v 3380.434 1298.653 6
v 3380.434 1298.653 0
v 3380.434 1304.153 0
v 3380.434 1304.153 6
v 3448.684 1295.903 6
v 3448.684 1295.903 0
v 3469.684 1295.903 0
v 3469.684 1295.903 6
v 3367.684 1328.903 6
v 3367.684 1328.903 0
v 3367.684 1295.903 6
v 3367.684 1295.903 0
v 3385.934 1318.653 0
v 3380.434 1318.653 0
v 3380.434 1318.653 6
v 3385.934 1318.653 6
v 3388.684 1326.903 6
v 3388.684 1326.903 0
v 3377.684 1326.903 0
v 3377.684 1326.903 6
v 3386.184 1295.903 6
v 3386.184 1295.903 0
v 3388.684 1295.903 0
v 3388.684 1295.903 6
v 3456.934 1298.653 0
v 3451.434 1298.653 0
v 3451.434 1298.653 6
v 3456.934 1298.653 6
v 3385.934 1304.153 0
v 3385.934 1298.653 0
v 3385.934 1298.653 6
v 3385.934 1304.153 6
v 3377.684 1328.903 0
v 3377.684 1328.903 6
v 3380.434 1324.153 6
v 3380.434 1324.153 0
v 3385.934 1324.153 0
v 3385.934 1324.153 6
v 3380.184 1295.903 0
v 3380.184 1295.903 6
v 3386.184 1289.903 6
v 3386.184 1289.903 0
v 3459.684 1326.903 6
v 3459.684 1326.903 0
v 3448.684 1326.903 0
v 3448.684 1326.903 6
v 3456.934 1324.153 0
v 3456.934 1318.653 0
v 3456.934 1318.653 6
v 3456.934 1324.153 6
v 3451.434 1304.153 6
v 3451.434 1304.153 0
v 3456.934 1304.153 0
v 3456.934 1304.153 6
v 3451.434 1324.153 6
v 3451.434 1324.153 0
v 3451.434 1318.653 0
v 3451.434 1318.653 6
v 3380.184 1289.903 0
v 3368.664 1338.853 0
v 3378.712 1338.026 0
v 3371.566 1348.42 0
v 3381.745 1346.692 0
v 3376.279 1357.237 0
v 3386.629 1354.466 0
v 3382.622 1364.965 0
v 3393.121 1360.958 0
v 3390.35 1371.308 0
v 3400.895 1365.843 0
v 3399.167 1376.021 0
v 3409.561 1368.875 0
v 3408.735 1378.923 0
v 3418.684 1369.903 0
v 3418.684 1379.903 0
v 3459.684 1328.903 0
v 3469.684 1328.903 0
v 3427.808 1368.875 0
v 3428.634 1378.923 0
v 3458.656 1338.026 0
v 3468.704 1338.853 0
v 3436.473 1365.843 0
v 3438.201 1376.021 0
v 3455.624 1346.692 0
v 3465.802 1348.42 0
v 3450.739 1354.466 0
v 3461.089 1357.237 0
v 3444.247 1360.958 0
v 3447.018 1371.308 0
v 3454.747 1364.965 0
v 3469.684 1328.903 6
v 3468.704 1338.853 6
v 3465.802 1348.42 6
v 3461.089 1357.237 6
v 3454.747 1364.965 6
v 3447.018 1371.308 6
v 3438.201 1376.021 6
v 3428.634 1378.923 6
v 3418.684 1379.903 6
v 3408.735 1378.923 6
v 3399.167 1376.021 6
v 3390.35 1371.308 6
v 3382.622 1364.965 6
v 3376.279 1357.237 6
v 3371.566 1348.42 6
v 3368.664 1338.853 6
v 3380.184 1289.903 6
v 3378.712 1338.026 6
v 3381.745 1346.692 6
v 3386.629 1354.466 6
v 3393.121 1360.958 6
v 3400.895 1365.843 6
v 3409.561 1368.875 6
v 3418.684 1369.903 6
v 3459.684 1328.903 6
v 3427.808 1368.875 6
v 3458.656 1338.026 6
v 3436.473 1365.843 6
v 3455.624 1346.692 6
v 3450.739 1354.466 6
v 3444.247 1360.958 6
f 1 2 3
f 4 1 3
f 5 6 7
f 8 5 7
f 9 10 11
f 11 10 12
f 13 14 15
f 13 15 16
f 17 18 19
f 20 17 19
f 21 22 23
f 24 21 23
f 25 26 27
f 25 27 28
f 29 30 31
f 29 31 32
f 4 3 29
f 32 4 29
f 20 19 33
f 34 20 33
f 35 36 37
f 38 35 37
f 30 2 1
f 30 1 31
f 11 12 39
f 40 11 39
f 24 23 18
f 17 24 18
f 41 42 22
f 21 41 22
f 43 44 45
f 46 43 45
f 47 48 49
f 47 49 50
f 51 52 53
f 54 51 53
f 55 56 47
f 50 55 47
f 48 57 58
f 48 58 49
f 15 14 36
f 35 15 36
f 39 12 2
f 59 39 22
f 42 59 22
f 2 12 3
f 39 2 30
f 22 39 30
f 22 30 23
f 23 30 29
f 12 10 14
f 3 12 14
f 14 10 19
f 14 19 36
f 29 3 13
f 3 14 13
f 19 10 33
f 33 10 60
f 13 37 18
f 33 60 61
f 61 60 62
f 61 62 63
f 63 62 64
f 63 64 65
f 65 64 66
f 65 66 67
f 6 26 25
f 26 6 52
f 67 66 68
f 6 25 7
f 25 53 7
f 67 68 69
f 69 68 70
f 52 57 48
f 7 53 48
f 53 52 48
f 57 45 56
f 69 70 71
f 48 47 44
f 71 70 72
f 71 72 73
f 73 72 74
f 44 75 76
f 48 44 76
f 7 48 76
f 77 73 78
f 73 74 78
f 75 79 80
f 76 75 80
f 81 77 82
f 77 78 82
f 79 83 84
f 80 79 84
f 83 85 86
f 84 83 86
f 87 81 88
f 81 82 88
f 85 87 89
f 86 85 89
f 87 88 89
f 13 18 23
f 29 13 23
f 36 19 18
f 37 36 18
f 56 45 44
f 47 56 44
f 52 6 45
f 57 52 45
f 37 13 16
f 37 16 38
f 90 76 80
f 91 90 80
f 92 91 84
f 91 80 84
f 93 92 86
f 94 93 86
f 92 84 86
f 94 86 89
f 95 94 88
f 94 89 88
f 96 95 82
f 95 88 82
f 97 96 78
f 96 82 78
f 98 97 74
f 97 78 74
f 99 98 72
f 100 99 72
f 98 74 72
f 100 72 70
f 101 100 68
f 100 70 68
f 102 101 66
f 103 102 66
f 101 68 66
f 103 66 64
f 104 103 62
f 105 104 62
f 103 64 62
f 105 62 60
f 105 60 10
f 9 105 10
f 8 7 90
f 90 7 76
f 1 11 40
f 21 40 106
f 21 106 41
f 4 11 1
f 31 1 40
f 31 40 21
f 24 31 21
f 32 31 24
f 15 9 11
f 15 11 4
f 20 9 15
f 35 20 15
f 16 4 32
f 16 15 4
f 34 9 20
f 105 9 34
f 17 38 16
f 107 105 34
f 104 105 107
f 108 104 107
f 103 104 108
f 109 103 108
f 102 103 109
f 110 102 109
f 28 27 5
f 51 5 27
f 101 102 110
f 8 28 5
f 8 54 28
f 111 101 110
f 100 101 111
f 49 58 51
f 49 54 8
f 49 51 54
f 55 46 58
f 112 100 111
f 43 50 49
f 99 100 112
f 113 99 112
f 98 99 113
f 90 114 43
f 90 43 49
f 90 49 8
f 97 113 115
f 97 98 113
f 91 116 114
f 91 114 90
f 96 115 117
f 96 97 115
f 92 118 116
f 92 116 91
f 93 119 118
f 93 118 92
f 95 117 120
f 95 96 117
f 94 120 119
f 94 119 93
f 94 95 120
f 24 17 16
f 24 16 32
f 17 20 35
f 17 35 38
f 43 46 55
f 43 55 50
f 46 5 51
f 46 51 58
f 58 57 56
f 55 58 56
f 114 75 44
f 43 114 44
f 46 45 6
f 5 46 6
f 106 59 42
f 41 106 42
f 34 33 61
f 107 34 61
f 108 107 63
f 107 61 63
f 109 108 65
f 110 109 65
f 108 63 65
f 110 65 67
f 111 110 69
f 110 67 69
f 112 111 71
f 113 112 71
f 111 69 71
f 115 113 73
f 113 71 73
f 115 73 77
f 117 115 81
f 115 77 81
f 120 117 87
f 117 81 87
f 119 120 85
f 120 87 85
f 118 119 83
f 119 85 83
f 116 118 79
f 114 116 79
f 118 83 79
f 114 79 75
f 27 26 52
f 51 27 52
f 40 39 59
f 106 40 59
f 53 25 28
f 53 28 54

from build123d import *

# Parameters (mm, degrees)
MODEL_W             = 5.5
MODEL_H             = 5.5
BOSS_EXTRUDE1_DEPTH = 6


with BuildPart() as part:
    # Model → Boss-Extrude1 (new body)
    with BuildSketch(Plane.XY):
        with BuildLine():
            Line((3367.68426312, 1328.903027574), (3367.68426312, 1295.903027574))
            Line((3367.68426312, 1295.903027574), (3380.18426312, 1295.903027574))
            Line((3380.18426312, 1295.903027574), (3380.18426312, 1289.903027574))
            Line((3380.18426312, 1289.903027574), (3386.18426312, 1289.903027574))
            Line((3386.18426312, 1289.903027574), (3386.18426312, 1295.903027574))
            Line((3386.18426312, 1295.903027574), (3388.68426312, 1295.903027574))
            Line((3388.68426312, 1295.903027574), (3388.68426312, 1326.903027574))
            Line((3388.68426312, 1326.903027574), (3377.68426312, 1326.903027574))
            Line((3377.68426312, 1326.903027574), (3377.68426312, 1328.903027574))
            ThreePointArc((3377.68426312, 1328.903027574), (3418.68426312, 1369.903027574), (3459.68426312, 1328.903027574))
            Line((3459.68426312, 1328.903027574), (3459.68426312, 1326.903027574))
            Line((3459.68426312, 1326.903027574), (3448.68426312, 1326.903027574))
            Line((3448.68426312, 1326.903027574), (3448.68426312, 1295.903027574))
            Line((3448.68426312, 1295.903027574), (3459.68426312, 1295.903027574))
            Line((3459.68426312, 1295.903027574), (3469.68426312, 1295.903027574))
            Line((3469.68426312, 1295.903027574), (3469.68426312, 1328.903027574))
            ThreePointArc((3469.68426312, 1328.903027574), (3418.68426312, 1379.903027574), (3367.68426312, 1328.903027574))
        make_face()
        with Locations((3454.18426312, 1301.403027574)):
            Rectangle(MODEL_W, MODEL_H, mode=Mode.SUBTRACT)
        with Locations((3454.18426312, 1321.403027574)):
            Rectangle(MODEL_W, MODEL_H, mode=Mode.SUBTRACT)
        with Locations((3383.18426312, 1301.403027574)):
            Rectangle(MODEL_W, MODEL_H, mode=Mode.SUBTRACT)
        with Locations((3383.18426312, 1321.403027574)):
            Rectangle(MODEL_W, MODEL_H, mode=Mode.SUBTRACT)
    extrude(amount=BOSS_EXTRUDE1_DEPTH)


solid = part.part
